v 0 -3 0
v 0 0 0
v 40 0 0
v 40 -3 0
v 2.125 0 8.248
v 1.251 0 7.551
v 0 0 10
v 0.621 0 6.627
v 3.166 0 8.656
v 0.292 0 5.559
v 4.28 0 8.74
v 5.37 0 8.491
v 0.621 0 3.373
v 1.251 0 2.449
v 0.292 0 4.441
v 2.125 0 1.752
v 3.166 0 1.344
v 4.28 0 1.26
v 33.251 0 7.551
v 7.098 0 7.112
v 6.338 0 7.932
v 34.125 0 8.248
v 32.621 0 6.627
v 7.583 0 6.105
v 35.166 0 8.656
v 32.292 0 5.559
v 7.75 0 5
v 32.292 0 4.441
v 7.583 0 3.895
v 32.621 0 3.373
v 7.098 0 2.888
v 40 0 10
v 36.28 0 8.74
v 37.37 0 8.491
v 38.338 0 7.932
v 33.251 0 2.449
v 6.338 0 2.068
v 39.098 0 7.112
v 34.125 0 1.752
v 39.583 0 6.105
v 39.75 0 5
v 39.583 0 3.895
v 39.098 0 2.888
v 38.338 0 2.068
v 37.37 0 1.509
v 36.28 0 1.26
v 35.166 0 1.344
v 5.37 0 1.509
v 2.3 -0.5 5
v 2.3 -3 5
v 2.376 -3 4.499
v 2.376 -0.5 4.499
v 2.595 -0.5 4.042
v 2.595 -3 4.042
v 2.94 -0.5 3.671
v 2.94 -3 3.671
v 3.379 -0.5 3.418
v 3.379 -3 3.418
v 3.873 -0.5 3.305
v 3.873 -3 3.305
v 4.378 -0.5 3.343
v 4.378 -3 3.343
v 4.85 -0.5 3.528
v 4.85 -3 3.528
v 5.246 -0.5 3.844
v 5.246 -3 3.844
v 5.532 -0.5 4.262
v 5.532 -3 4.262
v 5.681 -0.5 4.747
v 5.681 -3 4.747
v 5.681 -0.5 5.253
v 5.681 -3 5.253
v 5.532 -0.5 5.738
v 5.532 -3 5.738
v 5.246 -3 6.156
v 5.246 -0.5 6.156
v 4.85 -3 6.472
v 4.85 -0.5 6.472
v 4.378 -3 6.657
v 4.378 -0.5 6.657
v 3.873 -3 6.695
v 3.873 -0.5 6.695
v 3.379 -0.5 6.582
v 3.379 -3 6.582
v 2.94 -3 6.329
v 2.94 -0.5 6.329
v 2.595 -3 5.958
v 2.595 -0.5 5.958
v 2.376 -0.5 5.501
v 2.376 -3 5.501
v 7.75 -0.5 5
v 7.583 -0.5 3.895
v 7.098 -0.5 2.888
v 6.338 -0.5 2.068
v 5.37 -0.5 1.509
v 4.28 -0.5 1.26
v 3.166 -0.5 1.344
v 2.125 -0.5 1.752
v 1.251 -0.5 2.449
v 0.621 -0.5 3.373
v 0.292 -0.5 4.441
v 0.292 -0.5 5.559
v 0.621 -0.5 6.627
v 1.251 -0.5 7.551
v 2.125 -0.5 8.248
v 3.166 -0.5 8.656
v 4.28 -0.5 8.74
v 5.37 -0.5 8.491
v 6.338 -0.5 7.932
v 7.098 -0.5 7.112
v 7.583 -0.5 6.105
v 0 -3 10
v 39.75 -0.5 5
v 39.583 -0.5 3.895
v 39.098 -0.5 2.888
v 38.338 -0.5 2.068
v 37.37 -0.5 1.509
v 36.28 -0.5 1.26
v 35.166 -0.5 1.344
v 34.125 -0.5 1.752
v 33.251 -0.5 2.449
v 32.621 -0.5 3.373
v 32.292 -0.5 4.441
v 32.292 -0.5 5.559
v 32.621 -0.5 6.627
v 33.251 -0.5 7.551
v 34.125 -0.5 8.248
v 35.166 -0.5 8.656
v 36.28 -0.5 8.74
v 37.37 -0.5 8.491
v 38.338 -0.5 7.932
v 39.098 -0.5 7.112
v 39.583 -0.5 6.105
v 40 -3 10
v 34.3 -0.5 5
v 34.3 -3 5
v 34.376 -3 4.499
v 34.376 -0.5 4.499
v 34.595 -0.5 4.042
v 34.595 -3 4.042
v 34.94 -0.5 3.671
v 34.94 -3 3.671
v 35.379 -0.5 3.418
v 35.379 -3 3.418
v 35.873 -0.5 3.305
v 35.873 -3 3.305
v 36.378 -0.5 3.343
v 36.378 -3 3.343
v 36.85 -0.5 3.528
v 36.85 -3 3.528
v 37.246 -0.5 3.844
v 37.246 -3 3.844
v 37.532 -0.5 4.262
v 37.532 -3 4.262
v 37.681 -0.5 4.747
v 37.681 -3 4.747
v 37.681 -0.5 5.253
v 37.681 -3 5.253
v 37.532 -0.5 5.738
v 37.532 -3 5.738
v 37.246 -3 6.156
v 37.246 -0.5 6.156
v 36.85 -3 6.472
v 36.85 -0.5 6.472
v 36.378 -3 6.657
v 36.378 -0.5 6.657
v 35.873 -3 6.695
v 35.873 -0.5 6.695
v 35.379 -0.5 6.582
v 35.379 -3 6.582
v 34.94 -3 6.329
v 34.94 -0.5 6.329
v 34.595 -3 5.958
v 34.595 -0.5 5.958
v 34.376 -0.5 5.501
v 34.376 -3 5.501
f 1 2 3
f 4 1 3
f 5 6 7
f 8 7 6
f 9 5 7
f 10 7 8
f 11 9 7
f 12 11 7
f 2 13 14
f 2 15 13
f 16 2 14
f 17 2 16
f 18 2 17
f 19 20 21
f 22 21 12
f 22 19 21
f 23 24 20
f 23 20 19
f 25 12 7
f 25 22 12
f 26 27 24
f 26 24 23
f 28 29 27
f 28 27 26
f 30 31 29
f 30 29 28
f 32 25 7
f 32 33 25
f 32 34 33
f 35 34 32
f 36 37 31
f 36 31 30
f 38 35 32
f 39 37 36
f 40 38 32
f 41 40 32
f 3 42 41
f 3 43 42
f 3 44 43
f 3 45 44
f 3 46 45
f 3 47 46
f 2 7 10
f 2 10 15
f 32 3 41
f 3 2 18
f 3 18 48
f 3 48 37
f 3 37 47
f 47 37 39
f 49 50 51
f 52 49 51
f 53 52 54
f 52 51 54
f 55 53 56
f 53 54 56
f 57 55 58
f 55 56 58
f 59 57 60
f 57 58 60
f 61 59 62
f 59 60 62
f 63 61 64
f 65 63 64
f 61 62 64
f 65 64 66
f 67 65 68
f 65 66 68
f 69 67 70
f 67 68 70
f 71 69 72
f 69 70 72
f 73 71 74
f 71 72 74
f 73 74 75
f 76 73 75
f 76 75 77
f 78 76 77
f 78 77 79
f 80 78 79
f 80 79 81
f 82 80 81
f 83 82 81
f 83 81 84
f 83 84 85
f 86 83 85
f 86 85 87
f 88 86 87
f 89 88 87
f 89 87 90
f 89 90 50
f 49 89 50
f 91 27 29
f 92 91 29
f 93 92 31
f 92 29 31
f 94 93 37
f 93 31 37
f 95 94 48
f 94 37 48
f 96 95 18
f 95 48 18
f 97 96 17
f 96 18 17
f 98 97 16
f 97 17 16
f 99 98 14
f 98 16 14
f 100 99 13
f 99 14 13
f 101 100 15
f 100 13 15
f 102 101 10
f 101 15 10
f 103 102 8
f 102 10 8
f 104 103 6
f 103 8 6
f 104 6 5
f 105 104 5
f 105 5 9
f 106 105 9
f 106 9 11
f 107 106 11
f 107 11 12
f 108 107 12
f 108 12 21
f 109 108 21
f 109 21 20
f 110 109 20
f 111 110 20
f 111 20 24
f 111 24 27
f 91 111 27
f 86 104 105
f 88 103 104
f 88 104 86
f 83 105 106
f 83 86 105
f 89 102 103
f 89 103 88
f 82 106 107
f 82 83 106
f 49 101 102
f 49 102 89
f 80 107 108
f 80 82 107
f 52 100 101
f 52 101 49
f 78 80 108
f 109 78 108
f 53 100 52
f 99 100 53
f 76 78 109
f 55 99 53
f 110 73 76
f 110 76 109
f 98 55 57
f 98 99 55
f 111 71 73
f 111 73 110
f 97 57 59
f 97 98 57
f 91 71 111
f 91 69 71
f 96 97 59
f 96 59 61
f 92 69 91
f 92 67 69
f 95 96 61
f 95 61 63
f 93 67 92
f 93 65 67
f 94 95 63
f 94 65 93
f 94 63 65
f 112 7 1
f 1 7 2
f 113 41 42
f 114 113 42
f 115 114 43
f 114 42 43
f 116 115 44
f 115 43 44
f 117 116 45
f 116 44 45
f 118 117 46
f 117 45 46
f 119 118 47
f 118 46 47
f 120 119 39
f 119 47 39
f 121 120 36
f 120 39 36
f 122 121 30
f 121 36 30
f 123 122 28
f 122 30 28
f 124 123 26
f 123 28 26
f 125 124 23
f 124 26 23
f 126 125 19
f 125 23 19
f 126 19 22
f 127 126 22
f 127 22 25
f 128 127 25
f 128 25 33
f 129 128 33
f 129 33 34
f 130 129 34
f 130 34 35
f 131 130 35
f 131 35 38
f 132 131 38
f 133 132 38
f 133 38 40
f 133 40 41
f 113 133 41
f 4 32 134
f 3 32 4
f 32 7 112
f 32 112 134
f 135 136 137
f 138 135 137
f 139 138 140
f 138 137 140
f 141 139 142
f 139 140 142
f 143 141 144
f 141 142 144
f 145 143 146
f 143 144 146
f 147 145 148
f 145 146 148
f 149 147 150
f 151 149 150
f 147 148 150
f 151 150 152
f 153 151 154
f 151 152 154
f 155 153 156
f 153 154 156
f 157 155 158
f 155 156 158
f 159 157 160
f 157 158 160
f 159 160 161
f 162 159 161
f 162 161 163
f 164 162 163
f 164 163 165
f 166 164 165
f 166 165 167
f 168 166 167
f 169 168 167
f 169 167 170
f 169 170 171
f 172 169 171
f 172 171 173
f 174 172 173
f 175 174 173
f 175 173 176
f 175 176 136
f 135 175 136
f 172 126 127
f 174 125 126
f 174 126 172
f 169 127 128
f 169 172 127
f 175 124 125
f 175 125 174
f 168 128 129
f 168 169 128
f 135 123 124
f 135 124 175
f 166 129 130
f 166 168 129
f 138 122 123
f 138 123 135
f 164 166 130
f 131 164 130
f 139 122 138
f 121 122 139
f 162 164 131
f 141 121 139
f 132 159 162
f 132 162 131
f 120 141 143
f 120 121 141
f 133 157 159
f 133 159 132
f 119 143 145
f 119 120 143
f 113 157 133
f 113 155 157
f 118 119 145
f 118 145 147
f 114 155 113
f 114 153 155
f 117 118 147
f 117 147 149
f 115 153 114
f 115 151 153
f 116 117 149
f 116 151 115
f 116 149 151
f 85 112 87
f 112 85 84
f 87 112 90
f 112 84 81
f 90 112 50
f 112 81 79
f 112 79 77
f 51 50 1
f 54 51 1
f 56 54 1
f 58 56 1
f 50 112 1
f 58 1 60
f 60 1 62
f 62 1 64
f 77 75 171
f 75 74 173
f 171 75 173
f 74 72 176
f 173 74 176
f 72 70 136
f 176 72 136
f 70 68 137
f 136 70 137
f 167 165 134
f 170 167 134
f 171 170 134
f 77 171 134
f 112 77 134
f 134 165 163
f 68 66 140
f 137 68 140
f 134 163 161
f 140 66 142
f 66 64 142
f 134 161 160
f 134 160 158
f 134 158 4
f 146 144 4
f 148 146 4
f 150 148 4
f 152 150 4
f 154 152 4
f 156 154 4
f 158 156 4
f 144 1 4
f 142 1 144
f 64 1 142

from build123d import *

# Parameters (mm, degrees)
SKETCH1_W                                        = 40
SKETCH1_H                                        = 10
BOSS_EXTRUDE1_DEPTH                              = 3
CBORE_FOR_M3_PAN_HEAD_MACHINE_SCREW1_D           = 3.4
CBORE_FOR_M3_PAN_HEAD_MACHINE_SCREW1_DEPTH       = 3
CBORE_FOR_M3_PAN_HEAD_MACHINE_SCREW1_CBORE_D     = 7.5
CBORE_FOR_M3_PAN_HEAD_MACHINE_SCREW1_CBORE_DEPTH = 0.5


with BuildPart() as part:
    # Sketch1 → Boss-Extrude1 (new body)
    with BuildSketch(Plane(origin=(0, 0, 0), x_dir=(1, 0, 0), z_dir=(0, 1, 0))):
        with Locations((20, -5)):
            Rectangle(SKETCH1_W, SKETCH1_H)
    extrude(amount=-BOSS_EXTRUDE1_DEPTH)

    # CBORE for M3 Pan Head Machine Screw1
    with Locations(Plane(origin=(0, 0, 0), x_dir=(1, 0, 0), z_dir=(0, 1, 0))):
        with Locations((4, -5), (36, -5)):
            CounterBoreHole(CBORE_FOR_M3_PAN_HEAD_MACHINE_SCREW1_D / 2, CBORE_FOR_M3_PAN_HEAD_MACHINE_SCREW1_CBORE_D / 2, CBORE_FOR_M3_PAN_HEAD_MACHINE_SCREW1_CBORE_DEPTH, depth=CBORE_FOR_M3_PAN_HEAD_MACHINE_SCREW1_DEPTH)


solid = part.part
